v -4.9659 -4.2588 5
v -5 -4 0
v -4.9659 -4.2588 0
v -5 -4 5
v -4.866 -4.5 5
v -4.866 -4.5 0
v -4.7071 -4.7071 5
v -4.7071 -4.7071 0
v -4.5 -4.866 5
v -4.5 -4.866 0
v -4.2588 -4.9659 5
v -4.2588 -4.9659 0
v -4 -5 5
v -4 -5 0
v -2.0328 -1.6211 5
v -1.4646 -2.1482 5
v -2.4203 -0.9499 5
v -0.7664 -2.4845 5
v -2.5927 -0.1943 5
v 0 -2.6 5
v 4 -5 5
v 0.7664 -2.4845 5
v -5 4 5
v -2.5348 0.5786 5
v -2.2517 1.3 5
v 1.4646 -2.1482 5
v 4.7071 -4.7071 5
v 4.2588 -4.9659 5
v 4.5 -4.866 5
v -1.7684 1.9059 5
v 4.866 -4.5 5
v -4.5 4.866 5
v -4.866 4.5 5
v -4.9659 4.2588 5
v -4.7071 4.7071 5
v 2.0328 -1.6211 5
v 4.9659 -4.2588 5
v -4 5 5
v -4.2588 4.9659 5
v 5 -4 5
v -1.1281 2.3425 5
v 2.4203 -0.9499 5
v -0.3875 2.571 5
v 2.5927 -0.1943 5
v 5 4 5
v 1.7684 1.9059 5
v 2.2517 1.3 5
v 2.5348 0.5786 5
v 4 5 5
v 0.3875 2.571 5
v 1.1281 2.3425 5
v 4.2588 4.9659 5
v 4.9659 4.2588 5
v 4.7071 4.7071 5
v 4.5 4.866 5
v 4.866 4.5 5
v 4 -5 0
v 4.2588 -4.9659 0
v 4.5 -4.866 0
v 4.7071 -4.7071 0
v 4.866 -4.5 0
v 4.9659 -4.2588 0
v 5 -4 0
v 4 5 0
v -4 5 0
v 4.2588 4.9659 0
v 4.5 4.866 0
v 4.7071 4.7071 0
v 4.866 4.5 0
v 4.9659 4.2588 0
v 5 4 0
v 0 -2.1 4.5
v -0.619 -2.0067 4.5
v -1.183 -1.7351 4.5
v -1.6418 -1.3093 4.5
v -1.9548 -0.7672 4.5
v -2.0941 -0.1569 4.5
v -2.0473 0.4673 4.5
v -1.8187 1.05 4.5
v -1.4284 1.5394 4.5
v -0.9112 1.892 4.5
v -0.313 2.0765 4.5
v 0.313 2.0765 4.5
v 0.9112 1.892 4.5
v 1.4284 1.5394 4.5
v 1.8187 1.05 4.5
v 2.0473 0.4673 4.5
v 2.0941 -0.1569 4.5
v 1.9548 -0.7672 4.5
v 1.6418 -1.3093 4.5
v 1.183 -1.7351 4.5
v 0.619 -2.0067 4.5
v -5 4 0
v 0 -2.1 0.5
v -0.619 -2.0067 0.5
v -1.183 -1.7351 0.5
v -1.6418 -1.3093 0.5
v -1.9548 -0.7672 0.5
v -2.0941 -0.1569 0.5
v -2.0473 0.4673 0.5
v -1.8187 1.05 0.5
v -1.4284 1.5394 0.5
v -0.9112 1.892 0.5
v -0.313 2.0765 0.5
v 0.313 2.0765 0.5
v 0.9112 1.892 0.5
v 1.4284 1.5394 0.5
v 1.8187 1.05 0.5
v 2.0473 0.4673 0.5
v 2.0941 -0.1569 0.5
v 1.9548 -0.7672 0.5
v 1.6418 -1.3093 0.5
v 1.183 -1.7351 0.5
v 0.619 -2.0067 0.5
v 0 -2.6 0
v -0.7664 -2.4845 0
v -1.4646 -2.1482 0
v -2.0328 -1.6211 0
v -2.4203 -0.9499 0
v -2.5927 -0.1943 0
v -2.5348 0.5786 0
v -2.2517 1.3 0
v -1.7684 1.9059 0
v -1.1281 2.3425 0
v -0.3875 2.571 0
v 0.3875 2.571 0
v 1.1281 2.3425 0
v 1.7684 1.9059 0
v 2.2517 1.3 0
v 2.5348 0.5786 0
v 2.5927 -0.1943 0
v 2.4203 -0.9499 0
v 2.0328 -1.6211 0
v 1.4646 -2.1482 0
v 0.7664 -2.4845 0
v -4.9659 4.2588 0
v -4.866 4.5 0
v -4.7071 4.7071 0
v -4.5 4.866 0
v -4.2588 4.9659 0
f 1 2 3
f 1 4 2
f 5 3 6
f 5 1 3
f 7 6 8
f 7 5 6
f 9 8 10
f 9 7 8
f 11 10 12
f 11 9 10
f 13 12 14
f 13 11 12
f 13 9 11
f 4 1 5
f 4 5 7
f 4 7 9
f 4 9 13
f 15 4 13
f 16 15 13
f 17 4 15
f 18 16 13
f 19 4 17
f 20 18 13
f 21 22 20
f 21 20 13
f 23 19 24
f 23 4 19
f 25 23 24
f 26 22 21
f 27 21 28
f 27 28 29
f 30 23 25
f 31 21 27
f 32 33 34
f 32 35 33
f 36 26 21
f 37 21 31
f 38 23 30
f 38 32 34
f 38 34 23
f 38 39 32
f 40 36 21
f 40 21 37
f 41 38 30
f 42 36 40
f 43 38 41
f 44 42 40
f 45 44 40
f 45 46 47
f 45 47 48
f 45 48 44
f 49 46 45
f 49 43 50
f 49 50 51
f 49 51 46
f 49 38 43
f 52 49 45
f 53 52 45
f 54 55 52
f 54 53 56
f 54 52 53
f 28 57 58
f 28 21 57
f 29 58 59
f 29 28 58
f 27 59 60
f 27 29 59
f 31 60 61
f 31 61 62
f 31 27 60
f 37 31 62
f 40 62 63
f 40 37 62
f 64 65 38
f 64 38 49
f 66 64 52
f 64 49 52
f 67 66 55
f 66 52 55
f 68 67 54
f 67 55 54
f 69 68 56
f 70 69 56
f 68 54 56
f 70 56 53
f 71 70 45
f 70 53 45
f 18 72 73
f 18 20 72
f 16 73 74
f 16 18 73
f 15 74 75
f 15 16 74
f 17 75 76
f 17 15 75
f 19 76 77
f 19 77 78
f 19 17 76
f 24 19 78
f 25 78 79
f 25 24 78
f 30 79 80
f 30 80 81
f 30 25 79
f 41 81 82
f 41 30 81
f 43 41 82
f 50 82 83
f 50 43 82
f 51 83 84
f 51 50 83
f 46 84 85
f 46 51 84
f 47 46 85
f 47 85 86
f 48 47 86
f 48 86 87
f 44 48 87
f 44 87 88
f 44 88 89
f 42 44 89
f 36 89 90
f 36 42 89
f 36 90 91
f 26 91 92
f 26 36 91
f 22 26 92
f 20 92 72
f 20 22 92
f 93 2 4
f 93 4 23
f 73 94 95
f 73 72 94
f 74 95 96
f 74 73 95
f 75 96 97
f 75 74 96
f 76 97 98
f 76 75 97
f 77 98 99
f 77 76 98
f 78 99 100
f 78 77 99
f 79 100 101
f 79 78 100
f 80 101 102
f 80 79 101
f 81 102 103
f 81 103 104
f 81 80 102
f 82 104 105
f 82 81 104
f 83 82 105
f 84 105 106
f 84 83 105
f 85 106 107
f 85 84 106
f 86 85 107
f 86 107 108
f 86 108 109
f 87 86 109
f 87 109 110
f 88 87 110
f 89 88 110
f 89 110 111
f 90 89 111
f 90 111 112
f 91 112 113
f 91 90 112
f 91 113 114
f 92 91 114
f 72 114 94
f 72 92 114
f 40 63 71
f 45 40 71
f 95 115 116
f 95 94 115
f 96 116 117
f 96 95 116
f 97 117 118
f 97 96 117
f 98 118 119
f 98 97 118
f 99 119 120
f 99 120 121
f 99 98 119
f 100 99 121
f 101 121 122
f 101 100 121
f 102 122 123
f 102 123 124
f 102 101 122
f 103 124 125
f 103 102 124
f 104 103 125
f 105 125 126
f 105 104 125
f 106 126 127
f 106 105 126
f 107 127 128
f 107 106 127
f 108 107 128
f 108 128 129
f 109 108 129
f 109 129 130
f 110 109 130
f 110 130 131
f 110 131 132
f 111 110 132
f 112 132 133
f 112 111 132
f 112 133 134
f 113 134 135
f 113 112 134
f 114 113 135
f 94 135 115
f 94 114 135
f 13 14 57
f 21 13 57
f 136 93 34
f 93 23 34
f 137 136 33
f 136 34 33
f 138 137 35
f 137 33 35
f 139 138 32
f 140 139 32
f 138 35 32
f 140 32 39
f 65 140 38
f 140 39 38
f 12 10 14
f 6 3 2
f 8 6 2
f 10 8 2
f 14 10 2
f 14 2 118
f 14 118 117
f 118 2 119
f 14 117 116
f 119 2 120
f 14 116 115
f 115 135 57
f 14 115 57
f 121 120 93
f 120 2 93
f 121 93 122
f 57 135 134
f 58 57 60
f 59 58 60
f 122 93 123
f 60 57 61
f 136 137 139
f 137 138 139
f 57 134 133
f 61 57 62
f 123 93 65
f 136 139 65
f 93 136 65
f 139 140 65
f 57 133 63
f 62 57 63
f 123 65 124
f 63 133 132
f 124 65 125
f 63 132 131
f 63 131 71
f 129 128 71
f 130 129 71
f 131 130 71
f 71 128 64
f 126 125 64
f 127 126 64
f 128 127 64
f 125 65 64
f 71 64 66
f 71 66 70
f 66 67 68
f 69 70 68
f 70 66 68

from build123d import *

# Parameters (mm, degrees)
SKETCH_1_W      = 10
SKETCH_1_H      = 10
EXTRUDE_1_DEPTH = 5
FILLET_1_R      = 1


with BuildPart() as part:
    # Эскиз1 → Бобышка-Вытянуть1 (new body)
    with BuildSketch(Plane.XY):
        Rectangle(SKETCH_1_W, SKETCH_1_H)
    extrude(amount=EXTRUDE_1_DEPTH)

    # Эскиз3 → Отверстие обработанное метчиком M51 (revolve, cut)
    with BuildSketch(Plane(origin=(0, 0, 5), x_dir=(0, -1, 0), z_dir=(1, 0, 0))):
        Polygon((0, 0), (0, 5), (2.6, 5), (2.1, 4.5), (2.1, 0.5), (2.6, 0), align=None)
    revolve(axis=Axis((0, 0, 11.35), (0, 0, -1)), mode=Mode.SUBTRACT)

    # Скругление1
    fillet_1_edges = [part.edges().sort_by_distance(p)[0] for p in [
        (5, -5, 2.5),
        (-5, -5, 2.5),
        (-5, 5, 2.5),
        (5, 5, 2.5),
    ]]
    fillet(fillet_1_edges, radius=FILLET_1_R)


solid = part.part
